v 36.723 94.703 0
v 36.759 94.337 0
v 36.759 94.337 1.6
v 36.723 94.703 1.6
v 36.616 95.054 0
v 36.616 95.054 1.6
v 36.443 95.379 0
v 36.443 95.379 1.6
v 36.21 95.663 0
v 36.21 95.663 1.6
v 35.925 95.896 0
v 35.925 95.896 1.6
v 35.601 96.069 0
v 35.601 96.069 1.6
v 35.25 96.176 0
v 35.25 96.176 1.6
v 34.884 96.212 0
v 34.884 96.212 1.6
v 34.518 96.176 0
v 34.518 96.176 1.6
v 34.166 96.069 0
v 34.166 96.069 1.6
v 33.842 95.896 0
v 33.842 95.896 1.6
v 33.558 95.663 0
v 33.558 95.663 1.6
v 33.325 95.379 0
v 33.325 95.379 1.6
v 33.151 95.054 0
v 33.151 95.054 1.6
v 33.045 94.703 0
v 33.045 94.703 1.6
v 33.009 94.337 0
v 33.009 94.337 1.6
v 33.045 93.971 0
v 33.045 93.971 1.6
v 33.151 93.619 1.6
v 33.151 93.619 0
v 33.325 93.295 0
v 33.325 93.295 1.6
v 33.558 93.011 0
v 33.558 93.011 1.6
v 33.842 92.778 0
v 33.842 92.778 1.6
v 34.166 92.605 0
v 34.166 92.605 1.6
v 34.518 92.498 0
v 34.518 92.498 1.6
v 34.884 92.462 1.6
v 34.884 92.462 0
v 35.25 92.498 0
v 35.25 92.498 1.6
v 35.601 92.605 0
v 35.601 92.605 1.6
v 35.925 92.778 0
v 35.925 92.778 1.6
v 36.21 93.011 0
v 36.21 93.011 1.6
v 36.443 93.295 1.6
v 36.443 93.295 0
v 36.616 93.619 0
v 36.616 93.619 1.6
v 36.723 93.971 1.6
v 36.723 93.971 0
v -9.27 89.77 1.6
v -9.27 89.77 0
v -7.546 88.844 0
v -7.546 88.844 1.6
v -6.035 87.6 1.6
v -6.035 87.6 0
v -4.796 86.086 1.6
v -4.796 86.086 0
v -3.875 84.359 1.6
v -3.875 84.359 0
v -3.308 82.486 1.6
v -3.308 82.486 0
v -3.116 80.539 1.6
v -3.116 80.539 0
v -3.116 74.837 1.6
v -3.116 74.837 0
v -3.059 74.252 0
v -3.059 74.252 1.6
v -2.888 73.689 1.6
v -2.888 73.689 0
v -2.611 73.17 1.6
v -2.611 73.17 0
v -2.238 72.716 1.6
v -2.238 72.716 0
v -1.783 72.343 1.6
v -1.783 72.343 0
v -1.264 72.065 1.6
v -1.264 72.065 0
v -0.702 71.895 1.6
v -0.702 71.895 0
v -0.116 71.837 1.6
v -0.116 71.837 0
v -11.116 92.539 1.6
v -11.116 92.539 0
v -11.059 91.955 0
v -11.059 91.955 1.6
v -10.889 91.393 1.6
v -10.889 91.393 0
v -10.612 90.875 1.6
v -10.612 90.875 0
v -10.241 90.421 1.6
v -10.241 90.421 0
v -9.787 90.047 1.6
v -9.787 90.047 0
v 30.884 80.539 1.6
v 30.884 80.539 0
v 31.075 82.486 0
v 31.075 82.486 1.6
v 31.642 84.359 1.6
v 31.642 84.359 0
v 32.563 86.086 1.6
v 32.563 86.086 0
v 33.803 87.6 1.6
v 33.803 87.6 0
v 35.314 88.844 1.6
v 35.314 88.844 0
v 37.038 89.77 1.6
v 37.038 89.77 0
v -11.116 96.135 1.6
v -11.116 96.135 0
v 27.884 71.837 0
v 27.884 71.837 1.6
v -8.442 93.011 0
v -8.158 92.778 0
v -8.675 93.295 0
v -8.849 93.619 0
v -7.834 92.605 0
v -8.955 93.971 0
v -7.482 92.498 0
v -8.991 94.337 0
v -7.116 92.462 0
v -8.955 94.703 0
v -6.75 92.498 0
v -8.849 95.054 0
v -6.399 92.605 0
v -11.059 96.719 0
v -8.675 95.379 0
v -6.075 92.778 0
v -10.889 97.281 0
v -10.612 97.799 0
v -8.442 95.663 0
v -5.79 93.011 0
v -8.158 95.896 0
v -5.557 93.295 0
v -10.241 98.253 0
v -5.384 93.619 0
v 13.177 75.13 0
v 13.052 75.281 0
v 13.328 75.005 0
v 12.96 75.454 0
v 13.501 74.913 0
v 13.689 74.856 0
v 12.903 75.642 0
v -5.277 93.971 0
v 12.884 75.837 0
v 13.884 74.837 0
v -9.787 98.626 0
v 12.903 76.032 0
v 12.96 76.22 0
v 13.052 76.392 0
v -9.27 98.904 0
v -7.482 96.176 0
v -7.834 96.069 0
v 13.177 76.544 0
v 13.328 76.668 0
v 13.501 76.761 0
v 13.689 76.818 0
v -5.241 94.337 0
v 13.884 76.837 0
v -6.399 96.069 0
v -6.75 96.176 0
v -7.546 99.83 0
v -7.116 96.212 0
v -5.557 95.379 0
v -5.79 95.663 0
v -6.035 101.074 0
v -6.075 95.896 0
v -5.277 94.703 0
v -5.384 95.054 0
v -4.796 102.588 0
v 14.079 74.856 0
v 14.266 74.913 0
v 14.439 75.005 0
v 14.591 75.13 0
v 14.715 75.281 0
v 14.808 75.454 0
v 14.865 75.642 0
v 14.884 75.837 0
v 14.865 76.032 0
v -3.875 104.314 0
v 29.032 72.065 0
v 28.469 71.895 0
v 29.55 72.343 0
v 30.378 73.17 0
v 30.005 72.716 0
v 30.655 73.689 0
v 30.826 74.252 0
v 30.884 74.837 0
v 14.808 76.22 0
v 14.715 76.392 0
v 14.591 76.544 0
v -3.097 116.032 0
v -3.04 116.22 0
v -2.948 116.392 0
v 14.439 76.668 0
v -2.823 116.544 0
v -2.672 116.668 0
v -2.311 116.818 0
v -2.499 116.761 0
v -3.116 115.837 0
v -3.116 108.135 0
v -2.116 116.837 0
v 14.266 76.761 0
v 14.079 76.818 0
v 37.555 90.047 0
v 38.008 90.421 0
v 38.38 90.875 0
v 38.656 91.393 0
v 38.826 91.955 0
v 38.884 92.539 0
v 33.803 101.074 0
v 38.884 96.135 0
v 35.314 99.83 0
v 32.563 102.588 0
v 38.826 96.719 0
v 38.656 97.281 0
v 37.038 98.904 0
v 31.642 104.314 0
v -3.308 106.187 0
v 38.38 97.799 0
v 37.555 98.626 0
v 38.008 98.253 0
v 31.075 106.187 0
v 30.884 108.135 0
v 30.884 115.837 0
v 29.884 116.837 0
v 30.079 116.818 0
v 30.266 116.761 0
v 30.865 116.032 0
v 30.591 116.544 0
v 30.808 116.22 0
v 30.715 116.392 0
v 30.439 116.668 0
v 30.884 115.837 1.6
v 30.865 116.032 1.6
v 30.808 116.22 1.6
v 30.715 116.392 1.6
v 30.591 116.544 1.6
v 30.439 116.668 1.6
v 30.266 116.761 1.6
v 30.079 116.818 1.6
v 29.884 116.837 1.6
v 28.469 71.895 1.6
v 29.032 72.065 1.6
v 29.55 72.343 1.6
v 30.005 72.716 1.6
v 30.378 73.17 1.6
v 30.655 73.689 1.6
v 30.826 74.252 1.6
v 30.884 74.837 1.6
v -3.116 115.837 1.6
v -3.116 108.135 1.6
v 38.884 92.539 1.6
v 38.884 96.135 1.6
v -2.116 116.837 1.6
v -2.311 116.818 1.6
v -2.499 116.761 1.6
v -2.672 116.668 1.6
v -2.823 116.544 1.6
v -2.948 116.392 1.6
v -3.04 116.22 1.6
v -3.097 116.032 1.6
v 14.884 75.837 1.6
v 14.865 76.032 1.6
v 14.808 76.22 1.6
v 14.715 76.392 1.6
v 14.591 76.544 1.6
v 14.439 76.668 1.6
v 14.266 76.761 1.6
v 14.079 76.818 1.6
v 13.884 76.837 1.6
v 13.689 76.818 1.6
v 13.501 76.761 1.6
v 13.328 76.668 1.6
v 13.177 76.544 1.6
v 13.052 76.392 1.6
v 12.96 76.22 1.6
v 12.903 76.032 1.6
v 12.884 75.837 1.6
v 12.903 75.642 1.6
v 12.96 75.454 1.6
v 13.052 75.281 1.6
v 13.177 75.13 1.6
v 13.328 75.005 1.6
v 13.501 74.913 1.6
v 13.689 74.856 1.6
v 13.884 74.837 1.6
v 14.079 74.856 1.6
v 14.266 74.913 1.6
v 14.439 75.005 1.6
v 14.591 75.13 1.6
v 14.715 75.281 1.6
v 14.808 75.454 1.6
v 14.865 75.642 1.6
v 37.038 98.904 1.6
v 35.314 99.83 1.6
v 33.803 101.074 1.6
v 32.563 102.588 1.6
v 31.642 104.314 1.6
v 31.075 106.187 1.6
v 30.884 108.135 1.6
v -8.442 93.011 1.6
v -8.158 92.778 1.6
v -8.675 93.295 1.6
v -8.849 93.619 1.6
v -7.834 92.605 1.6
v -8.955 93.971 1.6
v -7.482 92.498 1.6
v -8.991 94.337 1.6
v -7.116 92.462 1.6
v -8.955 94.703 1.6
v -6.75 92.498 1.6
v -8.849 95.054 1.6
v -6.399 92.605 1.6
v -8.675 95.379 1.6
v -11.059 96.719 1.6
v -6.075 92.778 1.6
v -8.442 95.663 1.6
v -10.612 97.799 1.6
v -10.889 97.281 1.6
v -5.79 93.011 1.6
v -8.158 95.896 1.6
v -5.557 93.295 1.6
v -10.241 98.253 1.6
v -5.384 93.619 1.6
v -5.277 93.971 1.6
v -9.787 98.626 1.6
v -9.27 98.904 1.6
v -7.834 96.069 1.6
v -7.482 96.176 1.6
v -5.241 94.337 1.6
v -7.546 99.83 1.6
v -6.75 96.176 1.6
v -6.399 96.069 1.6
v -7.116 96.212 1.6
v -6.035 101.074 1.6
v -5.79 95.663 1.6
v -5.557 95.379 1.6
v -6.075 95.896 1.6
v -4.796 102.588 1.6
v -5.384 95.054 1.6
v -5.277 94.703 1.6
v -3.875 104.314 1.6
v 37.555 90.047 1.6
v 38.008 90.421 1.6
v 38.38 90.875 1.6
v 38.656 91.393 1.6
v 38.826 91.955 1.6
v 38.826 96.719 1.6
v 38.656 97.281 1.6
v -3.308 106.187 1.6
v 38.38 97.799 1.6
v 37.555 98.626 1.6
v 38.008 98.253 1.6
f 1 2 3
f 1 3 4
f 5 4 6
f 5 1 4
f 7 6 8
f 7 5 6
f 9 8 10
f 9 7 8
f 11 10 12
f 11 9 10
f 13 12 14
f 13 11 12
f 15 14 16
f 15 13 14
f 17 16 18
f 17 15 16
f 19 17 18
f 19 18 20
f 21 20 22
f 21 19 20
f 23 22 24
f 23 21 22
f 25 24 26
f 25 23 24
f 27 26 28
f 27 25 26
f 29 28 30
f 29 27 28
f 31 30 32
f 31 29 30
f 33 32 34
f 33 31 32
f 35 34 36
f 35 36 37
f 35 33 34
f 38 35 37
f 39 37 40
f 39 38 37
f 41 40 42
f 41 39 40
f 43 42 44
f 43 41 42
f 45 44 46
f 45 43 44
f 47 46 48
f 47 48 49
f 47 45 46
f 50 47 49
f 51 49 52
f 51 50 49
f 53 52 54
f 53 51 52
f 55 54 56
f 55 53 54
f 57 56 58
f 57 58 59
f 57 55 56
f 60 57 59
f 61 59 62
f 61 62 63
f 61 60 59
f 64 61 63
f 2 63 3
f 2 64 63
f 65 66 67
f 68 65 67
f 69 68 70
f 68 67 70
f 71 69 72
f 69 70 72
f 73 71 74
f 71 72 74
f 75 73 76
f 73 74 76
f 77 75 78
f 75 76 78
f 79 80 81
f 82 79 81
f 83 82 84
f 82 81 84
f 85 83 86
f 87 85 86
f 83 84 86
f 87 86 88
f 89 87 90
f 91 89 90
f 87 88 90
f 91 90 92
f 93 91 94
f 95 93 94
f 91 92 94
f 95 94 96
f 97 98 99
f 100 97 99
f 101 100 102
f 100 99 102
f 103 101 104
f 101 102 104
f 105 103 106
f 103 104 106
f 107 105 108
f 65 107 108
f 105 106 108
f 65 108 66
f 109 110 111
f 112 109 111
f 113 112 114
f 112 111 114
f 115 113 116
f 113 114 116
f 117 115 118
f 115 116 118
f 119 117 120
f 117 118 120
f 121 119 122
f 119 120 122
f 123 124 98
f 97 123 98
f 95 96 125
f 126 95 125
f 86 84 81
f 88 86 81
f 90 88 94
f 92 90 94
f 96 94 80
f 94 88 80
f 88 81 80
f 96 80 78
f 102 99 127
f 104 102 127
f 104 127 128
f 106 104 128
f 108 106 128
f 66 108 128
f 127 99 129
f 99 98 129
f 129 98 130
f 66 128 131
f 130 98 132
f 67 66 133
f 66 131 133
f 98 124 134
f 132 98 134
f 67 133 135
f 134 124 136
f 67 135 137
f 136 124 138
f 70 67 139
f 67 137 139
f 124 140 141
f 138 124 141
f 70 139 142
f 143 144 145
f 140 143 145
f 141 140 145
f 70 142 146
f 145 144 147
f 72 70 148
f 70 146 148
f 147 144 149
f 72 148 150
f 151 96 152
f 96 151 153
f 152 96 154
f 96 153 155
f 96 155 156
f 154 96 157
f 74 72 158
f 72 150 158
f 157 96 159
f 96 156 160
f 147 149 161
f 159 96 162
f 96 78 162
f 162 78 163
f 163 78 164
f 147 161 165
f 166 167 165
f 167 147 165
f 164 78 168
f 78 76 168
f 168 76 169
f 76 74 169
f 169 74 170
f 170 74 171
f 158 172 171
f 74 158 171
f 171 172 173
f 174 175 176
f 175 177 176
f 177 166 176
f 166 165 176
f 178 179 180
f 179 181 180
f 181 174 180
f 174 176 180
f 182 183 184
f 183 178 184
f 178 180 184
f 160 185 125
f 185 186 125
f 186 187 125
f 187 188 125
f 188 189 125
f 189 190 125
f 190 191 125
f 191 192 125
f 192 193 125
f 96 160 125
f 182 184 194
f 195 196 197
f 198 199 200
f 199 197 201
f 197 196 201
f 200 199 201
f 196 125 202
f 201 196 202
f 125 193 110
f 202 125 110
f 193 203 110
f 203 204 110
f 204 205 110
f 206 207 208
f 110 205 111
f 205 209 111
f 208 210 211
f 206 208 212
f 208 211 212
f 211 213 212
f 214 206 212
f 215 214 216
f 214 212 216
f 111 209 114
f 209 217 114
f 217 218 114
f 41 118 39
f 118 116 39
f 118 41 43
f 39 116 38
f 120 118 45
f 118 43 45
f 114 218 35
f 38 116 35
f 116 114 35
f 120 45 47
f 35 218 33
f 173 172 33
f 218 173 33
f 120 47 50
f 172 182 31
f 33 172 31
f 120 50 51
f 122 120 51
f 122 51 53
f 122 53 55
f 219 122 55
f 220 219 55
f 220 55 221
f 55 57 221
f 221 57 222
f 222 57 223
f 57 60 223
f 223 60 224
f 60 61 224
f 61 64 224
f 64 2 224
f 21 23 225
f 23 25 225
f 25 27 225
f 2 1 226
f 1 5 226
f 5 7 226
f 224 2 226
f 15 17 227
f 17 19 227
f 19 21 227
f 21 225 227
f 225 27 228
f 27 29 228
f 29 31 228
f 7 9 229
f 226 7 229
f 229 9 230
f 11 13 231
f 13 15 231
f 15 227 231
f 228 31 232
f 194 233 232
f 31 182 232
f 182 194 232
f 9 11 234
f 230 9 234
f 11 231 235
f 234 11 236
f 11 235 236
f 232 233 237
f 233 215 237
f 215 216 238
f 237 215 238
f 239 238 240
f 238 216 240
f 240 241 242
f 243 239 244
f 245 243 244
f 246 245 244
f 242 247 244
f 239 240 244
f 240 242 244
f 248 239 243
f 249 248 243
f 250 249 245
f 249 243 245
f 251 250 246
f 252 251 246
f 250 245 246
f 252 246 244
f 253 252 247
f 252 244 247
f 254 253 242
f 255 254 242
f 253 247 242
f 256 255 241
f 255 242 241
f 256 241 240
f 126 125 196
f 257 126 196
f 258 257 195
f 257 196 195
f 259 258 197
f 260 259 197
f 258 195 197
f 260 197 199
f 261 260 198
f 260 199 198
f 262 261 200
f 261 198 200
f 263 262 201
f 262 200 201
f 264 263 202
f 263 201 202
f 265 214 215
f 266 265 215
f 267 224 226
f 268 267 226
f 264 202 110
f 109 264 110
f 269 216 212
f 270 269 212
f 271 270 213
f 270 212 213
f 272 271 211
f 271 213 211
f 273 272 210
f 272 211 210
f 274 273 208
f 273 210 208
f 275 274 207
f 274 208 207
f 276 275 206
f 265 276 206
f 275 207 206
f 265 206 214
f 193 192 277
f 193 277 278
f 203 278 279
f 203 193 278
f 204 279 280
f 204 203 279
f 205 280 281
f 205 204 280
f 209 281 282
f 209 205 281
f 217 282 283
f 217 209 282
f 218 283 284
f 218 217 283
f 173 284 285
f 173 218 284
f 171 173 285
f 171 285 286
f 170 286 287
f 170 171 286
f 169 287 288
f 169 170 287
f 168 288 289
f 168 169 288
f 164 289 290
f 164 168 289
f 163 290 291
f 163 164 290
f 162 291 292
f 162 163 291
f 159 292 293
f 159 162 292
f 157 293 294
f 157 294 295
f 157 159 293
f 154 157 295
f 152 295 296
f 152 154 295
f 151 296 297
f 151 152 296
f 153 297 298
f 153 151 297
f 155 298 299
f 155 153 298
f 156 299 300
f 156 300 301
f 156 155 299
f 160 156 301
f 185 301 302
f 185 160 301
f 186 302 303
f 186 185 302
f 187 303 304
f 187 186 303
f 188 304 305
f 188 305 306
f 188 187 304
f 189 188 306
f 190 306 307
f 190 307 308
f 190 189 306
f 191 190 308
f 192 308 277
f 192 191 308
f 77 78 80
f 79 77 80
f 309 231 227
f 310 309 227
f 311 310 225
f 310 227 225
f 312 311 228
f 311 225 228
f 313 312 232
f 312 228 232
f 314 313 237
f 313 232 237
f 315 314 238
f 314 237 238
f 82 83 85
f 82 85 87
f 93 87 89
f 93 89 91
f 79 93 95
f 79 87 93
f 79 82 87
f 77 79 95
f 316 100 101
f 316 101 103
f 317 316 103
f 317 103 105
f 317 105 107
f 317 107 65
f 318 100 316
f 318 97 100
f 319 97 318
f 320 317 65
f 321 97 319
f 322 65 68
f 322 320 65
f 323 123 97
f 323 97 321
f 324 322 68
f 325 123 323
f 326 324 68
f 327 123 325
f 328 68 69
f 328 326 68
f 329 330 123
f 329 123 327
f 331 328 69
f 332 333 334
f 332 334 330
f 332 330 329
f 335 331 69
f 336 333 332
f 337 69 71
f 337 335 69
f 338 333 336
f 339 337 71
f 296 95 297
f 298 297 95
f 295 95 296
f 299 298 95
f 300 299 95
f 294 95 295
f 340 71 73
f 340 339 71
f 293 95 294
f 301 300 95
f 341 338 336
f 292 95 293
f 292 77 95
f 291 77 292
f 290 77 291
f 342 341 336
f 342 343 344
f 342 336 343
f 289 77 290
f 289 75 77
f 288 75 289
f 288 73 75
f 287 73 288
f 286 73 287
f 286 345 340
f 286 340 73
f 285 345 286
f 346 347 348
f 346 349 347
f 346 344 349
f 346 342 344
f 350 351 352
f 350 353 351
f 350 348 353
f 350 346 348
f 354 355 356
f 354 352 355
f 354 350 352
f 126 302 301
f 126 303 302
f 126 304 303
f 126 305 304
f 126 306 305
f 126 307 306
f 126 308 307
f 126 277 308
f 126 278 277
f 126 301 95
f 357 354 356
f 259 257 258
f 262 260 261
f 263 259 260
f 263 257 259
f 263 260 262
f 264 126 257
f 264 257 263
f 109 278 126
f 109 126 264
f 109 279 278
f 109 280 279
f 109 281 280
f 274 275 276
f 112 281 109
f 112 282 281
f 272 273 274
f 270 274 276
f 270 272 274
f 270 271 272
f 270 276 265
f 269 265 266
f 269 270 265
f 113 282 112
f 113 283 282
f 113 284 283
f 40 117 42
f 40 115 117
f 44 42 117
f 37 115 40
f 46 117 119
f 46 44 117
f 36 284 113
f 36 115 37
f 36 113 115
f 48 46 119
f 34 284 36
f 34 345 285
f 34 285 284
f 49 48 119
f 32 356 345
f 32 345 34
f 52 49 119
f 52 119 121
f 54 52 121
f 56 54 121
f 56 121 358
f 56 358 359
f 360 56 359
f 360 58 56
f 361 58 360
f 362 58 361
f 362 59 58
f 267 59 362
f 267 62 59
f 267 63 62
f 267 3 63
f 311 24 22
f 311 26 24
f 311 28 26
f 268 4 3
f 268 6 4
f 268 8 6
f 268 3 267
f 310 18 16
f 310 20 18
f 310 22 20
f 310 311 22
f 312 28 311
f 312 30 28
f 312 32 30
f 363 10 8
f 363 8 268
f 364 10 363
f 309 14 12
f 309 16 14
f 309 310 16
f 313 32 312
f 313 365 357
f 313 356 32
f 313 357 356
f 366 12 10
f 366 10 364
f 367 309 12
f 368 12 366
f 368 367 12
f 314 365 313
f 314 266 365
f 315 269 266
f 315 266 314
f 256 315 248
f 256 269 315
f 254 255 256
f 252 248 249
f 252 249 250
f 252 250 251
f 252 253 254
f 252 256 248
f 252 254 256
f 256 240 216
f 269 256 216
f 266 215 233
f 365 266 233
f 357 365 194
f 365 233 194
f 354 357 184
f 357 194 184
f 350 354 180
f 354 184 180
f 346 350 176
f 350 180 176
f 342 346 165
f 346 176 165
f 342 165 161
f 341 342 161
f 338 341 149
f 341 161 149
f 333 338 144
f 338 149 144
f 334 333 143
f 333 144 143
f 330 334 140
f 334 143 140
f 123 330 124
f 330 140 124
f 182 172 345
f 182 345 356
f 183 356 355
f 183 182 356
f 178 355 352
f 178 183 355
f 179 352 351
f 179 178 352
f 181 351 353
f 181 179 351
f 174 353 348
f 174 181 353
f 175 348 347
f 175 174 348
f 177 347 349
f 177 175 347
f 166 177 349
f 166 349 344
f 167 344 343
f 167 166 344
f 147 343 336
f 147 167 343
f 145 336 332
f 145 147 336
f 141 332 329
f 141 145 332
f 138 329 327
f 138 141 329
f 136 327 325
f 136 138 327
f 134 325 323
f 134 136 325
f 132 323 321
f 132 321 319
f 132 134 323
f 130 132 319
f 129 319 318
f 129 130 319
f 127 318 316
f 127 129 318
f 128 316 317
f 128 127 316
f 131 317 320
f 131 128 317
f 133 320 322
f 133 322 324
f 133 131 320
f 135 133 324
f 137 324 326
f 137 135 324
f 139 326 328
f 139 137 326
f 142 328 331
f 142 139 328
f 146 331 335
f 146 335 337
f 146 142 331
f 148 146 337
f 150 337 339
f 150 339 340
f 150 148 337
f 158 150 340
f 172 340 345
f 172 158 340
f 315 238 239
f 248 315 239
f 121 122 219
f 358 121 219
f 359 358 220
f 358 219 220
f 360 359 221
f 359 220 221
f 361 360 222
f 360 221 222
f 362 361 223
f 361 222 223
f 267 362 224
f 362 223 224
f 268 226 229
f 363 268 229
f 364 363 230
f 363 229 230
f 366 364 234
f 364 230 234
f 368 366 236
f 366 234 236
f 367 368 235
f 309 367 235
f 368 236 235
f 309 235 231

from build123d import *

# Parameters (mm, degrees)
SKETCH1_R           = 1
SKETCH1_R_2         = 1.875
BOSS_EXTRUDE1_DEPTH = 1.6


with BuildPart() as part:
    # Sketch1 → Boss-Extrude1 (new body)
    with BuildSketch(Plane.XY):
        with BuildLine():
            Line((30.883756862, 108.134882568), (30.883756862, 115.836923597))
            ThreePointArc((30.883756862, 115.836923597), (30.590863643, 116.544030379), (29.883756862, 116.836923597))
            Line((29.883756862, 116.836923597), (-2.116243138, 116.836923597))
            ThreePointArc((-2.116243138, 116.836923597), (-2.82334992, 116.544030379), (-3.116243138, 115.836923597))
            Line((-3.116243138, 115.836923597), (-3.116243138, 108.134882568))
            ThreePointArc((-3.116243138, 108.134882568), (-4.795740195, 102.587880606), (-9.270089292, 98.904113338))
            ThreePointArc((-9.270089292, 98.904113338), (-10.612394021, 97.798983157), (-11.116243138, 96.134882568))
            Line((-11.116243138, 96.134882568), (-11.116243138, 92.538964626))
            ThreePointArc((-11.116243138, 92.538964626), (-10.612394021, 90.874864038), (-9.270089292, 89.769733857))
            ThreePointArc((-9.270089292, 89.769733857), (-4.795740195, 86.085966588), (-3.116243138, 80.538964626))
            Line((-3.116243138, 80.538964626), (-3.116243138, 74.836923597))
            ThreePointArc((-3.116243138, 74.836923597), (-2.237563482, 72.715603254), (-0.116243138, 71.836923597))
            Line((-0.116243138, 71.836923597), (27.883756862, 71.836923597))
            ThreePointArc((27.883756862, 71.836923597), (30.005077205, 72.715603254), (30.883756862, 74.836923597))
            Line((30.883756862, 74.836923597), (30.883756862, 80.538964626))
            ThreePointArc((30.883756862, 80.538964626), (32.563253918, 86.085966588), (37.037603016, 89.769733857))
            ThreePointArc((37.037603016, 89.769733857), (38.379907745, 90.874864038), (38.883756862, 92.538964626))
            Line((38.883756862, 92.538964626), (38.883756862, 96.134882568))
            ThreePointArc((38.883756862, 96.134882568), (38.379907745, 97.798983157), (37.037603016, 98.904113338))
            ThreePointArc((37.037603016, 98.904113338), (32.563253918, 102.587880606), (30.883756862, 108.134882568))
        make_face()
        with Locations((13.883756862, 75.836923597)):
            Circle(SKETCH1_R, mode=Mode.SUBTRACT)
        with Locations((-7.116243138, 94.336923597)):
            Circle(SKETCH1_R_2, mode=Mode.SUBTRACT)
        with Locations((34.883756862, 94.336923597)):
            Circle(SKETCH1_R_2, mode=Mode.SUBTRACT)
    extrude(amount=BOSS_EXTRUDE1_DEPTH)


solid = part.part
